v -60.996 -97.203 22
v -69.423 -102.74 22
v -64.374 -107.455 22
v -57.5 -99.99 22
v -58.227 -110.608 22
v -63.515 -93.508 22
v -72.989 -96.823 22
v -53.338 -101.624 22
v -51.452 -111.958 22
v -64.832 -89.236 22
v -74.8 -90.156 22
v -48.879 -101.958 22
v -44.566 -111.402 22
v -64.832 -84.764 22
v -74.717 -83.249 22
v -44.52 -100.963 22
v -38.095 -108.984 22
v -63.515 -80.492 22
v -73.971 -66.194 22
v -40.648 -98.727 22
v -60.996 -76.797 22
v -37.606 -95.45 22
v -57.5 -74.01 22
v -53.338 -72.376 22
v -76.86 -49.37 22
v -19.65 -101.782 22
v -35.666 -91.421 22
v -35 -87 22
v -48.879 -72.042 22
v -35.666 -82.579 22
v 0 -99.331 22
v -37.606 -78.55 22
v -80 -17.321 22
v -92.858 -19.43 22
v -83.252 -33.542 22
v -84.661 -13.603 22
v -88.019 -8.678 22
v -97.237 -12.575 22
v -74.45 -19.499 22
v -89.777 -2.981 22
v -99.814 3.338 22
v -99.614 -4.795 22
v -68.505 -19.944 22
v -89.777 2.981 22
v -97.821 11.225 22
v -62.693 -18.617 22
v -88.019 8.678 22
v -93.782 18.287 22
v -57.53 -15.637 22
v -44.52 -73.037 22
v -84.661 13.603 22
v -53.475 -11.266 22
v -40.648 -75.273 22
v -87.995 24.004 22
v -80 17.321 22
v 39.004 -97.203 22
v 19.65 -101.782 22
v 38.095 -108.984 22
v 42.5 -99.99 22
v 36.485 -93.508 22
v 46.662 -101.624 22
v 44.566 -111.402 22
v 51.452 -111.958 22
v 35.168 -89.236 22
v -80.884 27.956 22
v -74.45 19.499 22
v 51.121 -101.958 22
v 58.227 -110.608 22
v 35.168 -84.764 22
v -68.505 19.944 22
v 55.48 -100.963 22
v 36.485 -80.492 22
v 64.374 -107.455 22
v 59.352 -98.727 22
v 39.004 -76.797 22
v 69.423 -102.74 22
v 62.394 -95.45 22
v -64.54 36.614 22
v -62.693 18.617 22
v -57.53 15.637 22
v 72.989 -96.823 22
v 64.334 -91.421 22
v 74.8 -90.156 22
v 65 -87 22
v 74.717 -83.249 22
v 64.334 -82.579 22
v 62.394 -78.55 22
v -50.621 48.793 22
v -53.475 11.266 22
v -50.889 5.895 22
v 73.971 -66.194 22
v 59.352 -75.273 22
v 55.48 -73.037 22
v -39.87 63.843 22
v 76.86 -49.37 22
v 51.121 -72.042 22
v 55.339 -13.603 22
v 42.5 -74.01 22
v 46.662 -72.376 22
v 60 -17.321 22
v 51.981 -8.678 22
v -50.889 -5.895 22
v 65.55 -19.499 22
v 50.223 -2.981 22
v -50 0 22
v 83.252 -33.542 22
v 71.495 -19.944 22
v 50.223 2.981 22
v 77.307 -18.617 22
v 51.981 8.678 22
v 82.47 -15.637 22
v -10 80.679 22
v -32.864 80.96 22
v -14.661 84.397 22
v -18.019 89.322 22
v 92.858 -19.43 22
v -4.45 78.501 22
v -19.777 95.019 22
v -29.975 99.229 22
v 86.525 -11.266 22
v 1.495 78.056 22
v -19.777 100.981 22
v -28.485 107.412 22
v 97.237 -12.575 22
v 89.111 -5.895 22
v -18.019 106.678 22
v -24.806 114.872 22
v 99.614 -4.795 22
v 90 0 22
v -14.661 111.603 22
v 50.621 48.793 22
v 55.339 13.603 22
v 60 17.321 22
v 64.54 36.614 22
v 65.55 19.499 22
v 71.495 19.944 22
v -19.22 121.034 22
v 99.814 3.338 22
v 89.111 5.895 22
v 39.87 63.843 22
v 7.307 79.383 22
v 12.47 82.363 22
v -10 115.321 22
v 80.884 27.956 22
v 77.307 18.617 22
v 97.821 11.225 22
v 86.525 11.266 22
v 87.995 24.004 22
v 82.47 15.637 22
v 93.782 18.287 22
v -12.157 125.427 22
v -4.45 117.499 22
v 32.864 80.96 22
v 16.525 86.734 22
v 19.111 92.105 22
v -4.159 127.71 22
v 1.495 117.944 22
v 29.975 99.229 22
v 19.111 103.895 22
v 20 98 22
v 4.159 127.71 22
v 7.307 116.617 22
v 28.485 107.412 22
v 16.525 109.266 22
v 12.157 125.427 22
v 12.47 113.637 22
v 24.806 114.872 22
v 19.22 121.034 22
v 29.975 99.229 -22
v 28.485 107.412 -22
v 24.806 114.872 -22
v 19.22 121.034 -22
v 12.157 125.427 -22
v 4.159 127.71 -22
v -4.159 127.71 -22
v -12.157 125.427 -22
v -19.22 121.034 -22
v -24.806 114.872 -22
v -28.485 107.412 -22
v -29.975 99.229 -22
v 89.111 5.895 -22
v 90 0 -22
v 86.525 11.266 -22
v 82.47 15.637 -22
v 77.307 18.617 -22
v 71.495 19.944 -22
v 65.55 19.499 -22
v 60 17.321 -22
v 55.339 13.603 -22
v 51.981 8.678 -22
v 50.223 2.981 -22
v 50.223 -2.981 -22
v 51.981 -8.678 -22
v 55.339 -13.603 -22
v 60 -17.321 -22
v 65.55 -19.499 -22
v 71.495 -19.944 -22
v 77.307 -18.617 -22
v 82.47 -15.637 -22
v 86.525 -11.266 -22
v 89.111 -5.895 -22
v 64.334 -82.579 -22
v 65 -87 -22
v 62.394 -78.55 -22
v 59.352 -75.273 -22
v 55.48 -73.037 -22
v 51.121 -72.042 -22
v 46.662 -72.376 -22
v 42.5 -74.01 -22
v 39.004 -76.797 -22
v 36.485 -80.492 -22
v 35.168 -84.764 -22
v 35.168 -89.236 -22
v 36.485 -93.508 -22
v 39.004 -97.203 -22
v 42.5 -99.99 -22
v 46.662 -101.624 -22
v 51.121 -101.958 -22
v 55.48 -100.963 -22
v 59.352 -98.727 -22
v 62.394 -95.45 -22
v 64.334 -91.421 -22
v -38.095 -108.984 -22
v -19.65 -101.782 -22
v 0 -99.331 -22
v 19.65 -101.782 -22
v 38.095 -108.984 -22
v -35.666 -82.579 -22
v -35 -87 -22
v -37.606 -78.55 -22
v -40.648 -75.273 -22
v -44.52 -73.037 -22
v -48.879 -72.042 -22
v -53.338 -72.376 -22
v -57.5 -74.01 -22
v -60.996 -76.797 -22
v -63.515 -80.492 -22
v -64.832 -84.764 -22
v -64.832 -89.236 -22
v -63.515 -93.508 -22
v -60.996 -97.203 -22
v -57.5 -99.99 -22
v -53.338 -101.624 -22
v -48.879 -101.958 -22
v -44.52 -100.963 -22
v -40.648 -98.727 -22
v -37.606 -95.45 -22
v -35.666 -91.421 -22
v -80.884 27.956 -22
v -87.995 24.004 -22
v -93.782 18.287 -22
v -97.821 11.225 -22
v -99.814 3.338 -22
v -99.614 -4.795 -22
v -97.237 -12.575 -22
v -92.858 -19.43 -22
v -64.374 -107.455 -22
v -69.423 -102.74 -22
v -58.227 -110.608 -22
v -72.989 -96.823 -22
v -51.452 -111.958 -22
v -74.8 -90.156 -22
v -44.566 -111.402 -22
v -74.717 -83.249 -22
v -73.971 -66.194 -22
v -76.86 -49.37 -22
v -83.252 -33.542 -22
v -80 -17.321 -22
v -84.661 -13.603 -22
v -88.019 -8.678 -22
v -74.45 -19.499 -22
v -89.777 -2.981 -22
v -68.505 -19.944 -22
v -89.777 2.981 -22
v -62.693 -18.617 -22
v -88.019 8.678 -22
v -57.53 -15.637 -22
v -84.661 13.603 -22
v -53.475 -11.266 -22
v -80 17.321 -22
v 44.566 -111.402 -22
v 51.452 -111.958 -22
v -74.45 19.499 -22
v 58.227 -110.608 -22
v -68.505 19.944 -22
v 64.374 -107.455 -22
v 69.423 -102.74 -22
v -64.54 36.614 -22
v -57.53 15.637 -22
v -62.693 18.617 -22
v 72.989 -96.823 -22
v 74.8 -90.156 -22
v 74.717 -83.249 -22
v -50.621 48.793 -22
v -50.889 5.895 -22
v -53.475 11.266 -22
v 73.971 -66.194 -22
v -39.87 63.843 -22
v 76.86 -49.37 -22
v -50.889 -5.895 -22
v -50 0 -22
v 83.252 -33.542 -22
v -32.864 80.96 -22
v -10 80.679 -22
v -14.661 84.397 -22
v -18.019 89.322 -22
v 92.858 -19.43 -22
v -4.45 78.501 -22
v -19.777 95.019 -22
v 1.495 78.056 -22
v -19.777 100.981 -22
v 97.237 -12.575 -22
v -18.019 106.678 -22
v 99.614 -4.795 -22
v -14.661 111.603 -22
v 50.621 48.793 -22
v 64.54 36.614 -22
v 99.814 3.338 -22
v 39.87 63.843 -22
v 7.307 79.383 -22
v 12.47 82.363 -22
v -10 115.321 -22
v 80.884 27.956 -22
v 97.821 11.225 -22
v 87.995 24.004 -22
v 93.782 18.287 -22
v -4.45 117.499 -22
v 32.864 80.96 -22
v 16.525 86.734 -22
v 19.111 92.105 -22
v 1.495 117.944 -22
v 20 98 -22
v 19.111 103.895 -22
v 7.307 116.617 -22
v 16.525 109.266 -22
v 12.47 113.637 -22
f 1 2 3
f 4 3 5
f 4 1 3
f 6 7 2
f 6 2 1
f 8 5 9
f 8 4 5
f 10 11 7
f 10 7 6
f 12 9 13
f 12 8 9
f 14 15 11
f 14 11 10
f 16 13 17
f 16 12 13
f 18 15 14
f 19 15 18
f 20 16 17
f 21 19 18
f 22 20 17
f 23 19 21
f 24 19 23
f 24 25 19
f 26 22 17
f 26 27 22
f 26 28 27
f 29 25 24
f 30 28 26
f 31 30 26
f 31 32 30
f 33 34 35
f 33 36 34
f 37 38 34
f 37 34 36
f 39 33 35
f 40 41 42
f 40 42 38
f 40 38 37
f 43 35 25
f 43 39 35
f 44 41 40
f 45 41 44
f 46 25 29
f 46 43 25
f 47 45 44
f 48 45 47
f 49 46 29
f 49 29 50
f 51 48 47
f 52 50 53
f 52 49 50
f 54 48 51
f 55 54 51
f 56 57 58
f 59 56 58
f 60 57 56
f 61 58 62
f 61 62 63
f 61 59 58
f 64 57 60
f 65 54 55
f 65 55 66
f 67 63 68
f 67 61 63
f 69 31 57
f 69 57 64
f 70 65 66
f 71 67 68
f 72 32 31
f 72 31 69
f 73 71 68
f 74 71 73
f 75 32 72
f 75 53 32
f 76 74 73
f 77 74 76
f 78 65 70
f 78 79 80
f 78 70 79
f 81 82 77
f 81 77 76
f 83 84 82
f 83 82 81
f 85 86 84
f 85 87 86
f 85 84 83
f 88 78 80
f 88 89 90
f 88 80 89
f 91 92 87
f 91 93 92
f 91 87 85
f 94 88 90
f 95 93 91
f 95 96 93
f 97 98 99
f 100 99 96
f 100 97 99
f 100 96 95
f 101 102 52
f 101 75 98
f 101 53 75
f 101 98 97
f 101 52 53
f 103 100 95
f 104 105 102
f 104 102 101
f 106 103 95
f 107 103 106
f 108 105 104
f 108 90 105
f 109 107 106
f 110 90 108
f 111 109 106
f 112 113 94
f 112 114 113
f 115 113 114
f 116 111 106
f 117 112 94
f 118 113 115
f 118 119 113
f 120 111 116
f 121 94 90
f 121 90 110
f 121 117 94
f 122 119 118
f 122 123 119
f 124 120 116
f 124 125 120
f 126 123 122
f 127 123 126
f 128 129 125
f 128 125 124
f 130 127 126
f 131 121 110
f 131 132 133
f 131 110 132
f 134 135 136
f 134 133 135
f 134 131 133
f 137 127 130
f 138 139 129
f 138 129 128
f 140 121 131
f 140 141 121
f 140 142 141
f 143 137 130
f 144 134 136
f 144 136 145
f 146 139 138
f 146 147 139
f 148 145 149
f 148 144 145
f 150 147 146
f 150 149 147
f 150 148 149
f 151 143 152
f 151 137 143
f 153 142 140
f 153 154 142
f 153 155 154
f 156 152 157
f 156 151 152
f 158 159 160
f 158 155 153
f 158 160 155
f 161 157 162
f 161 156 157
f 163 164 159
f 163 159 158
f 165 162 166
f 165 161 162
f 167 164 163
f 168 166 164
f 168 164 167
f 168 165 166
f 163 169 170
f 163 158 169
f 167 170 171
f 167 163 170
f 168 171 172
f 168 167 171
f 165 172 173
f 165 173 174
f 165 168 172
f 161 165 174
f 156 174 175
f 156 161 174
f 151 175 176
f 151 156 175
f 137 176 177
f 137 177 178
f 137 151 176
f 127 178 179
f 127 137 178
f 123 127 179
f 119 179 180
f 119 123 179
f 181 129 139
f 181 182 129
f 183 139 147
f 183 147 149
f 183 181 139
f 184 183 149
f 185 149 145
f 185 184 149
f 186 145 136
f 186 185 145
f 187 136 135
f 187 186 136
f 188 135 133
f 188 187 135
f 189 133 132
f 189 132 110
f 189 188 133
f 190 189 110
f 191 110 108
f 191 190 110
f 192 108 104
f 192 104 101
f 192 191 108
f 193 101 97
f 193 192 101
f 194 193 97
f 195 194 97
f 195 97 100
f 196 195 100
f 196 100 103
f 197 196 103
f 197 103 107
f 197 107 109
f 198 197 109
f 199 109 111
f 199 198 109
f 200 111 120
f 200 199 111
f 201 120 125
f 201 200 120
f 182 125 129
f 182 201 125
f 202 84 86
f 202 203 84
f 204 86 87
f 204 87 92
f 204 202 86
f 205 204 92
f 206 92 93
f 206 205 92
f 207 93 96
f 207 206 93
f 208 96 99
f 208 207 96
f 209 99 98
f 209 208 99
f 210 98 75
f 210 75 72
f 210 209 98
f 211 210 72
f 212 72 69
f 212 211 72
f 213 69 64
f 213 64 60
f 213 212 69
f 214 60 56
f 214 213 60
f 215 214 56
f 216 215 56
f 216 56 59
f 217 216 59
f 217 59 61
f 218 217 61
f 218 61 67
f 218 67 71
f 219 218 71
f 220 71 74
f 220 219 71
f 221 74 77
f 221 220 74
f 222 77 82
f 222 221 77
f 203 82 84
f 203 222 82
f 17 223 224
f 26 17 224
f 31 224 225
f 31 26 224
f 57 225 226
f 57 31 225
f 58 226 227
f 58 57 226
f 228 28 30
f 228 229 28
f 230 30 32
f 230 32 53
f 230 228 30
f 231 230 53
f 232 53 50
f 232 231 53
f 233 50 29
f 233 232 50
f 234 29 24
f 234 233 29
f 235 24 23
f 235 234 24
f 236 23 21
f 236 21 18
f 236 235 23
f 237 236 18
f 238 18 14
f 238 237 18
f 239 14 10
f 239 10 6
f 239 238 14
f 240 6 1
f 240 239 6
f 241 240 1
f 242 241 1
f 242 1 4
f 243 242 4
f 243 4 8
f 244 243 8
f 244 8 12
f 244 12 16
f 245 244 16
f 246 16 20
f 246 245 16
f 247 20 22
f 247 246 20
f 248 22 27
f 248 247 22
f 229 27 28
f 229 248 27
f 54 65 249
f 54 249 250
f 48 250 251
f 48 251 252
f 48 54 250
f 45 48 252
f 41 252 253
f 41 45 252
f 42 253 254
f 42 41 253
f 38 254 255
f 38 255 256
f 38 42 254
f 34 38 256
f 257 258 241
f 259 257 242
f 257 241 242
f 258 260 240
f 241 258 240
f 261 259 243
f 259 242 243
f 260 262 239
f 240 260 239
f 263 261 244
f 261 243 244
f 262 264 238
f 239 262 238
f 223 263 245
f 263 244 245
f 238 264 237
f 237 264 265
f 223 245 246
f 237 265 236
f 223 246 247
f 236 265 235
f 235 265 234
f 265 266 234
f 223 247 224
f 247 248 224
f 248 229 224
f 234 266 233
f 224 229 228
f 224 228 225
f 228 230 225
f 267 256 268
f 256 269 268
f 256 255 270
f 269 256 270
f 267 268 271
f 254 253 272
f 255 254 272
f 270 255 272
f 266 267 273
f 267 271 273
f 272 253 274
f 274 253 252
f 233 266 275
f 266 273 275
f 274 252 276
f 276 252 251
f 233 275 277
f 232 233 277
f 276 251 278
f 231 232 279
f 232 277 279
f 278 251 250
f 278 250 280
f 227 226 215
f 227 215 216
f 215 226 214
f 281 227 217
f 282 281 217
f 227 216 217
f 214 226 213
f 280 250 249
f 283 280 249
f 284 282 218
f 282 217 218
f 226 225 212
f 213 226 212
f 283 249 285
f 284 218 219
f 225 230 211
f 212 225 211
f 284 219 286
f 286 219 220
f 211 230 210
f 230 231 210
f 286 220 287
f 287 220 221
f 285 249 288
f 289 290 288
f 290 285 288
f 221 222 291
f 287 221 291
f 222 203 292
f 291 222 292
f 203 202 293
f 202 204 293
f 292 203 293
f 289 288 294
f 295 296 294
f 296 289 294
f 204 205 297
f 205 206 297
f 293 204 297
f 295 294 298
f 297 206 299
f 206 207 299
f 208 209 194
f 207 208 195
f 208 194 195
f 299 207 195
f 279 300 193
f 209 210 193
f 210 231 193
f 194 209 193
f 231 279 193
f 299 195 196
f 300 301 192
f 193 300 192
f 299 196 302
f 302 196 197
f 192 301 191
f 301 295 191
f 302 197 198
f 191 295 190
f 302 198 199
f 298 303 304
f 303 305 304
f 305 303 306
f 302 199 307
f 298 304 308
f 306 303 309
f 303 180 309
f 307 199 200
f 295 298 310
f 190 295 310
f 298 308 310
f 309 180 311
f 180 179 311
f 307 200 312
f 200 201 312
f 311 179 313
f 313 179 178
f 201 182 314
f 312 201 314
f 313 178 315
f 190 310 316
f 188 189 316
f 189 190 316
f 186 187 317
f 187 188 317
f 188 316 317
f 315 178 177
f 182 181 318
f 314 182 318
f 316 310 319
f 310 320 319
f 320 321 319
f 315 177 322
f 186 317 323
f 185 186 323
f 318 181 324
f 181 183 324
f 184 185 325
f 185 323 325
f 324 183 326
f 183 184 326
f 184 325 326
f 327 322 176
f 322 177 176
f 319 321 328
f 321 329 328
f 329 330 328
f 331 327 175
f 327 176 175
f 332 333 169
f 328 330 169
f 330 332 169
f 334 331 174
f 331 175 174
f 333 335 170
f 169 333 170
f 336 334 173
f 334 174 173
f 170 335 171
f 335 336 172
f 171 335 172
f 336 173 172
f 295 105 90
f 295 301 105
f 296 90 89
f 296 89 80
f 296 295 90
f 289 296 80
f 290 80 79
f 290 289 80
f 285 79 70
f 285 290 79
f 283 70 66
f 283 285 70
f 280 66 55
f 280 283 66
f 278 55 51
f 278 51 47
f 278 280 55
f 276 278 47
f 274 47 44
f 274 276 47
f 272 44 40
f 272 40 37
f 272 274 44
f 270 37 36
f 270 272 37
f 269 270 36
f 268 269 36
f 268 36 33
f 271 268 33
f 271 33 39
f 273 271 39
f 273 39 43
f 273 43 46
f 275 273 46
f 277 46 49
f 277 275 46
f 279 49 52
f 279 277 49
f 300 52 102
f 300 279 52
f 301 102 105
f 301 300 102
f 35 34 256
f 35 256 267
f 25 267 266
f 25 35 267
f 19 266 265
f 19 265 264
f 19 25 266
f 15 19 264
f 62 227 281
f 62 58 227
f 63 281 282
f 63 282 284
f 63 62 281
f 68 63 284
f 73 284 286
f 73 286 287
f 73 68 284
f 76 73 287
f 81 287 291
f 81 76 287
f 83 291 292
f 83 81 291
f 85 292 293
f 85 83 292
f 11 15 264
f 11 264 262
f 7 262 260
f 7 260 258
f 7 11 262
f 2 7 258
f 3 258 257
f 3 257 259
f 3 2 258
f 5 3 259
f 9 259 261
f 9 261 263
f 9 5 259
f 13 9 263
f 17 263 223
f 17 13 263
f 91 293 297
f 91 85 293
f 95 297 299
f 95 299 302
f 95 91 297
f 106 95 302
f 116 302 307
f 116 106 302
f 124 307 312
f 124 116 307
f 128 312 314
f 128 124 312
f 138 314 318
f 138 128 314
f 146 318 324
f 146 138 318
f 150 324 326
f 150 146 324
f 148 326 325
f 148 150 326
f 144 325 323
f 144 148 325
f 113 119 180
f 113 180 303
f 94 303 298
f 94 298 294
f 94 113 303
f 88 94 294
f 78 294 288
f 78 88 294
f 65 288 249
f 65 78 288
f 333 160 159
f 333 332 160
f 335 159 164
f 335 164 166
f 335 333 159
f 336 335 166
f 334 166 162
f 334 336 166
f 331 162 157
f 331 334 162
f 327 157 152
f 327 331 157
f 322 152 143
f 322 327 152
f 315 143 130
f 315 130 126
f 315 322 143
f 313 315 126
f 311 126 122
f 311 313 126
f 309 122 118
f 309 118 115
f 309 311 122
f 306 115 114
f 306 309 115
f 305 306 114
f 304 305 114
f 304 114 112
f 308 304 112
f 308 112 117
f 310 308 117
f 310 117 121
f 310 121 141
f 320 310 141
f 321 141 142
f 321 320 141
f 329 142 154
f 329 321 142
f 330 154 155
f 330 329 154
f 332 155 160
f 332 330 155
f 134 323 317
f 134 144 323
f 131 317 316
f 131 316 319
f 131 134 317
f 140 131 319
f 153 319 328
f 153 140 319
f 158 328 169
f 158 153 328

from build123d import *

# Parameters (mm, degrees)
SKETCH1_R           = 20
SKETCH1_R_2         = 15
BOSS_EXTRUDE1_DEPTH = 22


with BuildPart() as part:
    # Sketch1 → Boss-Extrude1 (new, symmetric)
    with BuildSketch(Plane.XY):
        with BuildLine():
            ThreePointArc((29.974824802, 99.228770963), (0, 128), (-29.974824802, 99.228770963))
            ThreePointArc((-29.974824802, 99.228770963), (-44.809013245, 56.006438032), (-80.883915711, 27.95604369))
            ThreePointArc((-80.883915711, 27.95604369), (-99.085824928, 7.349475372), (-92.857575187, -19.430163575))
            ThreePointArc((-92.857575187, -19.430163575), (-76.859583983, -49.370140698), (-74.716930719, -83.248555502))
            ThreePointArc((-74.716930719, -83.248555502), (-64.373950523, -107.45457275), (-38.095238095, -108.983553944))
            ThreePointArc((-38.095238095, -108.983553944), (0, -99.330926563), (38.095238095, -108.983553944))
            ThreePointArc((38.095238095, -108.983553944), (64.373950523, -107.45457275), (74.716930719, -83.248555502))
            ThreePointArc((74.716930719, -83.248555502), (76.859583983, -49.370140698), (92.857575187, -19.430163575))
            ThreePointArc((92.857575187, -19.430163575), (99.085824928, 7.349475372), (80.883915711, 27.95604369))
            ThreePointArc((80.883915711, 27.95604369), (44.809013245, 56.006438032), (29.974824802, 99.228770963))
        make_face()
        with Locations((0, 98)):
            Circle(SKETCH1_R, mode=Mode.SUBTRACT)
        with Locations((70, 0)):
            Circle(SKETCH1_R, mode=Mode.SUBTRACT)
        with Locations((-70, 0)):
            Circle(SKETCH1_R, mode=Mode.SUBTRACT)
        with Locations((50, -87)):
            Circle(SKETCH1_R_2, mode=Mode.SUBTRACT)
        with Locations((-50, -87)):
            Circle(SKETCH1_R_2, mode=Mode.SUBTRACT)
    extrude(amount=BOSS_EXTRUDE1_DEPTH, both=True)


solid = part.part
